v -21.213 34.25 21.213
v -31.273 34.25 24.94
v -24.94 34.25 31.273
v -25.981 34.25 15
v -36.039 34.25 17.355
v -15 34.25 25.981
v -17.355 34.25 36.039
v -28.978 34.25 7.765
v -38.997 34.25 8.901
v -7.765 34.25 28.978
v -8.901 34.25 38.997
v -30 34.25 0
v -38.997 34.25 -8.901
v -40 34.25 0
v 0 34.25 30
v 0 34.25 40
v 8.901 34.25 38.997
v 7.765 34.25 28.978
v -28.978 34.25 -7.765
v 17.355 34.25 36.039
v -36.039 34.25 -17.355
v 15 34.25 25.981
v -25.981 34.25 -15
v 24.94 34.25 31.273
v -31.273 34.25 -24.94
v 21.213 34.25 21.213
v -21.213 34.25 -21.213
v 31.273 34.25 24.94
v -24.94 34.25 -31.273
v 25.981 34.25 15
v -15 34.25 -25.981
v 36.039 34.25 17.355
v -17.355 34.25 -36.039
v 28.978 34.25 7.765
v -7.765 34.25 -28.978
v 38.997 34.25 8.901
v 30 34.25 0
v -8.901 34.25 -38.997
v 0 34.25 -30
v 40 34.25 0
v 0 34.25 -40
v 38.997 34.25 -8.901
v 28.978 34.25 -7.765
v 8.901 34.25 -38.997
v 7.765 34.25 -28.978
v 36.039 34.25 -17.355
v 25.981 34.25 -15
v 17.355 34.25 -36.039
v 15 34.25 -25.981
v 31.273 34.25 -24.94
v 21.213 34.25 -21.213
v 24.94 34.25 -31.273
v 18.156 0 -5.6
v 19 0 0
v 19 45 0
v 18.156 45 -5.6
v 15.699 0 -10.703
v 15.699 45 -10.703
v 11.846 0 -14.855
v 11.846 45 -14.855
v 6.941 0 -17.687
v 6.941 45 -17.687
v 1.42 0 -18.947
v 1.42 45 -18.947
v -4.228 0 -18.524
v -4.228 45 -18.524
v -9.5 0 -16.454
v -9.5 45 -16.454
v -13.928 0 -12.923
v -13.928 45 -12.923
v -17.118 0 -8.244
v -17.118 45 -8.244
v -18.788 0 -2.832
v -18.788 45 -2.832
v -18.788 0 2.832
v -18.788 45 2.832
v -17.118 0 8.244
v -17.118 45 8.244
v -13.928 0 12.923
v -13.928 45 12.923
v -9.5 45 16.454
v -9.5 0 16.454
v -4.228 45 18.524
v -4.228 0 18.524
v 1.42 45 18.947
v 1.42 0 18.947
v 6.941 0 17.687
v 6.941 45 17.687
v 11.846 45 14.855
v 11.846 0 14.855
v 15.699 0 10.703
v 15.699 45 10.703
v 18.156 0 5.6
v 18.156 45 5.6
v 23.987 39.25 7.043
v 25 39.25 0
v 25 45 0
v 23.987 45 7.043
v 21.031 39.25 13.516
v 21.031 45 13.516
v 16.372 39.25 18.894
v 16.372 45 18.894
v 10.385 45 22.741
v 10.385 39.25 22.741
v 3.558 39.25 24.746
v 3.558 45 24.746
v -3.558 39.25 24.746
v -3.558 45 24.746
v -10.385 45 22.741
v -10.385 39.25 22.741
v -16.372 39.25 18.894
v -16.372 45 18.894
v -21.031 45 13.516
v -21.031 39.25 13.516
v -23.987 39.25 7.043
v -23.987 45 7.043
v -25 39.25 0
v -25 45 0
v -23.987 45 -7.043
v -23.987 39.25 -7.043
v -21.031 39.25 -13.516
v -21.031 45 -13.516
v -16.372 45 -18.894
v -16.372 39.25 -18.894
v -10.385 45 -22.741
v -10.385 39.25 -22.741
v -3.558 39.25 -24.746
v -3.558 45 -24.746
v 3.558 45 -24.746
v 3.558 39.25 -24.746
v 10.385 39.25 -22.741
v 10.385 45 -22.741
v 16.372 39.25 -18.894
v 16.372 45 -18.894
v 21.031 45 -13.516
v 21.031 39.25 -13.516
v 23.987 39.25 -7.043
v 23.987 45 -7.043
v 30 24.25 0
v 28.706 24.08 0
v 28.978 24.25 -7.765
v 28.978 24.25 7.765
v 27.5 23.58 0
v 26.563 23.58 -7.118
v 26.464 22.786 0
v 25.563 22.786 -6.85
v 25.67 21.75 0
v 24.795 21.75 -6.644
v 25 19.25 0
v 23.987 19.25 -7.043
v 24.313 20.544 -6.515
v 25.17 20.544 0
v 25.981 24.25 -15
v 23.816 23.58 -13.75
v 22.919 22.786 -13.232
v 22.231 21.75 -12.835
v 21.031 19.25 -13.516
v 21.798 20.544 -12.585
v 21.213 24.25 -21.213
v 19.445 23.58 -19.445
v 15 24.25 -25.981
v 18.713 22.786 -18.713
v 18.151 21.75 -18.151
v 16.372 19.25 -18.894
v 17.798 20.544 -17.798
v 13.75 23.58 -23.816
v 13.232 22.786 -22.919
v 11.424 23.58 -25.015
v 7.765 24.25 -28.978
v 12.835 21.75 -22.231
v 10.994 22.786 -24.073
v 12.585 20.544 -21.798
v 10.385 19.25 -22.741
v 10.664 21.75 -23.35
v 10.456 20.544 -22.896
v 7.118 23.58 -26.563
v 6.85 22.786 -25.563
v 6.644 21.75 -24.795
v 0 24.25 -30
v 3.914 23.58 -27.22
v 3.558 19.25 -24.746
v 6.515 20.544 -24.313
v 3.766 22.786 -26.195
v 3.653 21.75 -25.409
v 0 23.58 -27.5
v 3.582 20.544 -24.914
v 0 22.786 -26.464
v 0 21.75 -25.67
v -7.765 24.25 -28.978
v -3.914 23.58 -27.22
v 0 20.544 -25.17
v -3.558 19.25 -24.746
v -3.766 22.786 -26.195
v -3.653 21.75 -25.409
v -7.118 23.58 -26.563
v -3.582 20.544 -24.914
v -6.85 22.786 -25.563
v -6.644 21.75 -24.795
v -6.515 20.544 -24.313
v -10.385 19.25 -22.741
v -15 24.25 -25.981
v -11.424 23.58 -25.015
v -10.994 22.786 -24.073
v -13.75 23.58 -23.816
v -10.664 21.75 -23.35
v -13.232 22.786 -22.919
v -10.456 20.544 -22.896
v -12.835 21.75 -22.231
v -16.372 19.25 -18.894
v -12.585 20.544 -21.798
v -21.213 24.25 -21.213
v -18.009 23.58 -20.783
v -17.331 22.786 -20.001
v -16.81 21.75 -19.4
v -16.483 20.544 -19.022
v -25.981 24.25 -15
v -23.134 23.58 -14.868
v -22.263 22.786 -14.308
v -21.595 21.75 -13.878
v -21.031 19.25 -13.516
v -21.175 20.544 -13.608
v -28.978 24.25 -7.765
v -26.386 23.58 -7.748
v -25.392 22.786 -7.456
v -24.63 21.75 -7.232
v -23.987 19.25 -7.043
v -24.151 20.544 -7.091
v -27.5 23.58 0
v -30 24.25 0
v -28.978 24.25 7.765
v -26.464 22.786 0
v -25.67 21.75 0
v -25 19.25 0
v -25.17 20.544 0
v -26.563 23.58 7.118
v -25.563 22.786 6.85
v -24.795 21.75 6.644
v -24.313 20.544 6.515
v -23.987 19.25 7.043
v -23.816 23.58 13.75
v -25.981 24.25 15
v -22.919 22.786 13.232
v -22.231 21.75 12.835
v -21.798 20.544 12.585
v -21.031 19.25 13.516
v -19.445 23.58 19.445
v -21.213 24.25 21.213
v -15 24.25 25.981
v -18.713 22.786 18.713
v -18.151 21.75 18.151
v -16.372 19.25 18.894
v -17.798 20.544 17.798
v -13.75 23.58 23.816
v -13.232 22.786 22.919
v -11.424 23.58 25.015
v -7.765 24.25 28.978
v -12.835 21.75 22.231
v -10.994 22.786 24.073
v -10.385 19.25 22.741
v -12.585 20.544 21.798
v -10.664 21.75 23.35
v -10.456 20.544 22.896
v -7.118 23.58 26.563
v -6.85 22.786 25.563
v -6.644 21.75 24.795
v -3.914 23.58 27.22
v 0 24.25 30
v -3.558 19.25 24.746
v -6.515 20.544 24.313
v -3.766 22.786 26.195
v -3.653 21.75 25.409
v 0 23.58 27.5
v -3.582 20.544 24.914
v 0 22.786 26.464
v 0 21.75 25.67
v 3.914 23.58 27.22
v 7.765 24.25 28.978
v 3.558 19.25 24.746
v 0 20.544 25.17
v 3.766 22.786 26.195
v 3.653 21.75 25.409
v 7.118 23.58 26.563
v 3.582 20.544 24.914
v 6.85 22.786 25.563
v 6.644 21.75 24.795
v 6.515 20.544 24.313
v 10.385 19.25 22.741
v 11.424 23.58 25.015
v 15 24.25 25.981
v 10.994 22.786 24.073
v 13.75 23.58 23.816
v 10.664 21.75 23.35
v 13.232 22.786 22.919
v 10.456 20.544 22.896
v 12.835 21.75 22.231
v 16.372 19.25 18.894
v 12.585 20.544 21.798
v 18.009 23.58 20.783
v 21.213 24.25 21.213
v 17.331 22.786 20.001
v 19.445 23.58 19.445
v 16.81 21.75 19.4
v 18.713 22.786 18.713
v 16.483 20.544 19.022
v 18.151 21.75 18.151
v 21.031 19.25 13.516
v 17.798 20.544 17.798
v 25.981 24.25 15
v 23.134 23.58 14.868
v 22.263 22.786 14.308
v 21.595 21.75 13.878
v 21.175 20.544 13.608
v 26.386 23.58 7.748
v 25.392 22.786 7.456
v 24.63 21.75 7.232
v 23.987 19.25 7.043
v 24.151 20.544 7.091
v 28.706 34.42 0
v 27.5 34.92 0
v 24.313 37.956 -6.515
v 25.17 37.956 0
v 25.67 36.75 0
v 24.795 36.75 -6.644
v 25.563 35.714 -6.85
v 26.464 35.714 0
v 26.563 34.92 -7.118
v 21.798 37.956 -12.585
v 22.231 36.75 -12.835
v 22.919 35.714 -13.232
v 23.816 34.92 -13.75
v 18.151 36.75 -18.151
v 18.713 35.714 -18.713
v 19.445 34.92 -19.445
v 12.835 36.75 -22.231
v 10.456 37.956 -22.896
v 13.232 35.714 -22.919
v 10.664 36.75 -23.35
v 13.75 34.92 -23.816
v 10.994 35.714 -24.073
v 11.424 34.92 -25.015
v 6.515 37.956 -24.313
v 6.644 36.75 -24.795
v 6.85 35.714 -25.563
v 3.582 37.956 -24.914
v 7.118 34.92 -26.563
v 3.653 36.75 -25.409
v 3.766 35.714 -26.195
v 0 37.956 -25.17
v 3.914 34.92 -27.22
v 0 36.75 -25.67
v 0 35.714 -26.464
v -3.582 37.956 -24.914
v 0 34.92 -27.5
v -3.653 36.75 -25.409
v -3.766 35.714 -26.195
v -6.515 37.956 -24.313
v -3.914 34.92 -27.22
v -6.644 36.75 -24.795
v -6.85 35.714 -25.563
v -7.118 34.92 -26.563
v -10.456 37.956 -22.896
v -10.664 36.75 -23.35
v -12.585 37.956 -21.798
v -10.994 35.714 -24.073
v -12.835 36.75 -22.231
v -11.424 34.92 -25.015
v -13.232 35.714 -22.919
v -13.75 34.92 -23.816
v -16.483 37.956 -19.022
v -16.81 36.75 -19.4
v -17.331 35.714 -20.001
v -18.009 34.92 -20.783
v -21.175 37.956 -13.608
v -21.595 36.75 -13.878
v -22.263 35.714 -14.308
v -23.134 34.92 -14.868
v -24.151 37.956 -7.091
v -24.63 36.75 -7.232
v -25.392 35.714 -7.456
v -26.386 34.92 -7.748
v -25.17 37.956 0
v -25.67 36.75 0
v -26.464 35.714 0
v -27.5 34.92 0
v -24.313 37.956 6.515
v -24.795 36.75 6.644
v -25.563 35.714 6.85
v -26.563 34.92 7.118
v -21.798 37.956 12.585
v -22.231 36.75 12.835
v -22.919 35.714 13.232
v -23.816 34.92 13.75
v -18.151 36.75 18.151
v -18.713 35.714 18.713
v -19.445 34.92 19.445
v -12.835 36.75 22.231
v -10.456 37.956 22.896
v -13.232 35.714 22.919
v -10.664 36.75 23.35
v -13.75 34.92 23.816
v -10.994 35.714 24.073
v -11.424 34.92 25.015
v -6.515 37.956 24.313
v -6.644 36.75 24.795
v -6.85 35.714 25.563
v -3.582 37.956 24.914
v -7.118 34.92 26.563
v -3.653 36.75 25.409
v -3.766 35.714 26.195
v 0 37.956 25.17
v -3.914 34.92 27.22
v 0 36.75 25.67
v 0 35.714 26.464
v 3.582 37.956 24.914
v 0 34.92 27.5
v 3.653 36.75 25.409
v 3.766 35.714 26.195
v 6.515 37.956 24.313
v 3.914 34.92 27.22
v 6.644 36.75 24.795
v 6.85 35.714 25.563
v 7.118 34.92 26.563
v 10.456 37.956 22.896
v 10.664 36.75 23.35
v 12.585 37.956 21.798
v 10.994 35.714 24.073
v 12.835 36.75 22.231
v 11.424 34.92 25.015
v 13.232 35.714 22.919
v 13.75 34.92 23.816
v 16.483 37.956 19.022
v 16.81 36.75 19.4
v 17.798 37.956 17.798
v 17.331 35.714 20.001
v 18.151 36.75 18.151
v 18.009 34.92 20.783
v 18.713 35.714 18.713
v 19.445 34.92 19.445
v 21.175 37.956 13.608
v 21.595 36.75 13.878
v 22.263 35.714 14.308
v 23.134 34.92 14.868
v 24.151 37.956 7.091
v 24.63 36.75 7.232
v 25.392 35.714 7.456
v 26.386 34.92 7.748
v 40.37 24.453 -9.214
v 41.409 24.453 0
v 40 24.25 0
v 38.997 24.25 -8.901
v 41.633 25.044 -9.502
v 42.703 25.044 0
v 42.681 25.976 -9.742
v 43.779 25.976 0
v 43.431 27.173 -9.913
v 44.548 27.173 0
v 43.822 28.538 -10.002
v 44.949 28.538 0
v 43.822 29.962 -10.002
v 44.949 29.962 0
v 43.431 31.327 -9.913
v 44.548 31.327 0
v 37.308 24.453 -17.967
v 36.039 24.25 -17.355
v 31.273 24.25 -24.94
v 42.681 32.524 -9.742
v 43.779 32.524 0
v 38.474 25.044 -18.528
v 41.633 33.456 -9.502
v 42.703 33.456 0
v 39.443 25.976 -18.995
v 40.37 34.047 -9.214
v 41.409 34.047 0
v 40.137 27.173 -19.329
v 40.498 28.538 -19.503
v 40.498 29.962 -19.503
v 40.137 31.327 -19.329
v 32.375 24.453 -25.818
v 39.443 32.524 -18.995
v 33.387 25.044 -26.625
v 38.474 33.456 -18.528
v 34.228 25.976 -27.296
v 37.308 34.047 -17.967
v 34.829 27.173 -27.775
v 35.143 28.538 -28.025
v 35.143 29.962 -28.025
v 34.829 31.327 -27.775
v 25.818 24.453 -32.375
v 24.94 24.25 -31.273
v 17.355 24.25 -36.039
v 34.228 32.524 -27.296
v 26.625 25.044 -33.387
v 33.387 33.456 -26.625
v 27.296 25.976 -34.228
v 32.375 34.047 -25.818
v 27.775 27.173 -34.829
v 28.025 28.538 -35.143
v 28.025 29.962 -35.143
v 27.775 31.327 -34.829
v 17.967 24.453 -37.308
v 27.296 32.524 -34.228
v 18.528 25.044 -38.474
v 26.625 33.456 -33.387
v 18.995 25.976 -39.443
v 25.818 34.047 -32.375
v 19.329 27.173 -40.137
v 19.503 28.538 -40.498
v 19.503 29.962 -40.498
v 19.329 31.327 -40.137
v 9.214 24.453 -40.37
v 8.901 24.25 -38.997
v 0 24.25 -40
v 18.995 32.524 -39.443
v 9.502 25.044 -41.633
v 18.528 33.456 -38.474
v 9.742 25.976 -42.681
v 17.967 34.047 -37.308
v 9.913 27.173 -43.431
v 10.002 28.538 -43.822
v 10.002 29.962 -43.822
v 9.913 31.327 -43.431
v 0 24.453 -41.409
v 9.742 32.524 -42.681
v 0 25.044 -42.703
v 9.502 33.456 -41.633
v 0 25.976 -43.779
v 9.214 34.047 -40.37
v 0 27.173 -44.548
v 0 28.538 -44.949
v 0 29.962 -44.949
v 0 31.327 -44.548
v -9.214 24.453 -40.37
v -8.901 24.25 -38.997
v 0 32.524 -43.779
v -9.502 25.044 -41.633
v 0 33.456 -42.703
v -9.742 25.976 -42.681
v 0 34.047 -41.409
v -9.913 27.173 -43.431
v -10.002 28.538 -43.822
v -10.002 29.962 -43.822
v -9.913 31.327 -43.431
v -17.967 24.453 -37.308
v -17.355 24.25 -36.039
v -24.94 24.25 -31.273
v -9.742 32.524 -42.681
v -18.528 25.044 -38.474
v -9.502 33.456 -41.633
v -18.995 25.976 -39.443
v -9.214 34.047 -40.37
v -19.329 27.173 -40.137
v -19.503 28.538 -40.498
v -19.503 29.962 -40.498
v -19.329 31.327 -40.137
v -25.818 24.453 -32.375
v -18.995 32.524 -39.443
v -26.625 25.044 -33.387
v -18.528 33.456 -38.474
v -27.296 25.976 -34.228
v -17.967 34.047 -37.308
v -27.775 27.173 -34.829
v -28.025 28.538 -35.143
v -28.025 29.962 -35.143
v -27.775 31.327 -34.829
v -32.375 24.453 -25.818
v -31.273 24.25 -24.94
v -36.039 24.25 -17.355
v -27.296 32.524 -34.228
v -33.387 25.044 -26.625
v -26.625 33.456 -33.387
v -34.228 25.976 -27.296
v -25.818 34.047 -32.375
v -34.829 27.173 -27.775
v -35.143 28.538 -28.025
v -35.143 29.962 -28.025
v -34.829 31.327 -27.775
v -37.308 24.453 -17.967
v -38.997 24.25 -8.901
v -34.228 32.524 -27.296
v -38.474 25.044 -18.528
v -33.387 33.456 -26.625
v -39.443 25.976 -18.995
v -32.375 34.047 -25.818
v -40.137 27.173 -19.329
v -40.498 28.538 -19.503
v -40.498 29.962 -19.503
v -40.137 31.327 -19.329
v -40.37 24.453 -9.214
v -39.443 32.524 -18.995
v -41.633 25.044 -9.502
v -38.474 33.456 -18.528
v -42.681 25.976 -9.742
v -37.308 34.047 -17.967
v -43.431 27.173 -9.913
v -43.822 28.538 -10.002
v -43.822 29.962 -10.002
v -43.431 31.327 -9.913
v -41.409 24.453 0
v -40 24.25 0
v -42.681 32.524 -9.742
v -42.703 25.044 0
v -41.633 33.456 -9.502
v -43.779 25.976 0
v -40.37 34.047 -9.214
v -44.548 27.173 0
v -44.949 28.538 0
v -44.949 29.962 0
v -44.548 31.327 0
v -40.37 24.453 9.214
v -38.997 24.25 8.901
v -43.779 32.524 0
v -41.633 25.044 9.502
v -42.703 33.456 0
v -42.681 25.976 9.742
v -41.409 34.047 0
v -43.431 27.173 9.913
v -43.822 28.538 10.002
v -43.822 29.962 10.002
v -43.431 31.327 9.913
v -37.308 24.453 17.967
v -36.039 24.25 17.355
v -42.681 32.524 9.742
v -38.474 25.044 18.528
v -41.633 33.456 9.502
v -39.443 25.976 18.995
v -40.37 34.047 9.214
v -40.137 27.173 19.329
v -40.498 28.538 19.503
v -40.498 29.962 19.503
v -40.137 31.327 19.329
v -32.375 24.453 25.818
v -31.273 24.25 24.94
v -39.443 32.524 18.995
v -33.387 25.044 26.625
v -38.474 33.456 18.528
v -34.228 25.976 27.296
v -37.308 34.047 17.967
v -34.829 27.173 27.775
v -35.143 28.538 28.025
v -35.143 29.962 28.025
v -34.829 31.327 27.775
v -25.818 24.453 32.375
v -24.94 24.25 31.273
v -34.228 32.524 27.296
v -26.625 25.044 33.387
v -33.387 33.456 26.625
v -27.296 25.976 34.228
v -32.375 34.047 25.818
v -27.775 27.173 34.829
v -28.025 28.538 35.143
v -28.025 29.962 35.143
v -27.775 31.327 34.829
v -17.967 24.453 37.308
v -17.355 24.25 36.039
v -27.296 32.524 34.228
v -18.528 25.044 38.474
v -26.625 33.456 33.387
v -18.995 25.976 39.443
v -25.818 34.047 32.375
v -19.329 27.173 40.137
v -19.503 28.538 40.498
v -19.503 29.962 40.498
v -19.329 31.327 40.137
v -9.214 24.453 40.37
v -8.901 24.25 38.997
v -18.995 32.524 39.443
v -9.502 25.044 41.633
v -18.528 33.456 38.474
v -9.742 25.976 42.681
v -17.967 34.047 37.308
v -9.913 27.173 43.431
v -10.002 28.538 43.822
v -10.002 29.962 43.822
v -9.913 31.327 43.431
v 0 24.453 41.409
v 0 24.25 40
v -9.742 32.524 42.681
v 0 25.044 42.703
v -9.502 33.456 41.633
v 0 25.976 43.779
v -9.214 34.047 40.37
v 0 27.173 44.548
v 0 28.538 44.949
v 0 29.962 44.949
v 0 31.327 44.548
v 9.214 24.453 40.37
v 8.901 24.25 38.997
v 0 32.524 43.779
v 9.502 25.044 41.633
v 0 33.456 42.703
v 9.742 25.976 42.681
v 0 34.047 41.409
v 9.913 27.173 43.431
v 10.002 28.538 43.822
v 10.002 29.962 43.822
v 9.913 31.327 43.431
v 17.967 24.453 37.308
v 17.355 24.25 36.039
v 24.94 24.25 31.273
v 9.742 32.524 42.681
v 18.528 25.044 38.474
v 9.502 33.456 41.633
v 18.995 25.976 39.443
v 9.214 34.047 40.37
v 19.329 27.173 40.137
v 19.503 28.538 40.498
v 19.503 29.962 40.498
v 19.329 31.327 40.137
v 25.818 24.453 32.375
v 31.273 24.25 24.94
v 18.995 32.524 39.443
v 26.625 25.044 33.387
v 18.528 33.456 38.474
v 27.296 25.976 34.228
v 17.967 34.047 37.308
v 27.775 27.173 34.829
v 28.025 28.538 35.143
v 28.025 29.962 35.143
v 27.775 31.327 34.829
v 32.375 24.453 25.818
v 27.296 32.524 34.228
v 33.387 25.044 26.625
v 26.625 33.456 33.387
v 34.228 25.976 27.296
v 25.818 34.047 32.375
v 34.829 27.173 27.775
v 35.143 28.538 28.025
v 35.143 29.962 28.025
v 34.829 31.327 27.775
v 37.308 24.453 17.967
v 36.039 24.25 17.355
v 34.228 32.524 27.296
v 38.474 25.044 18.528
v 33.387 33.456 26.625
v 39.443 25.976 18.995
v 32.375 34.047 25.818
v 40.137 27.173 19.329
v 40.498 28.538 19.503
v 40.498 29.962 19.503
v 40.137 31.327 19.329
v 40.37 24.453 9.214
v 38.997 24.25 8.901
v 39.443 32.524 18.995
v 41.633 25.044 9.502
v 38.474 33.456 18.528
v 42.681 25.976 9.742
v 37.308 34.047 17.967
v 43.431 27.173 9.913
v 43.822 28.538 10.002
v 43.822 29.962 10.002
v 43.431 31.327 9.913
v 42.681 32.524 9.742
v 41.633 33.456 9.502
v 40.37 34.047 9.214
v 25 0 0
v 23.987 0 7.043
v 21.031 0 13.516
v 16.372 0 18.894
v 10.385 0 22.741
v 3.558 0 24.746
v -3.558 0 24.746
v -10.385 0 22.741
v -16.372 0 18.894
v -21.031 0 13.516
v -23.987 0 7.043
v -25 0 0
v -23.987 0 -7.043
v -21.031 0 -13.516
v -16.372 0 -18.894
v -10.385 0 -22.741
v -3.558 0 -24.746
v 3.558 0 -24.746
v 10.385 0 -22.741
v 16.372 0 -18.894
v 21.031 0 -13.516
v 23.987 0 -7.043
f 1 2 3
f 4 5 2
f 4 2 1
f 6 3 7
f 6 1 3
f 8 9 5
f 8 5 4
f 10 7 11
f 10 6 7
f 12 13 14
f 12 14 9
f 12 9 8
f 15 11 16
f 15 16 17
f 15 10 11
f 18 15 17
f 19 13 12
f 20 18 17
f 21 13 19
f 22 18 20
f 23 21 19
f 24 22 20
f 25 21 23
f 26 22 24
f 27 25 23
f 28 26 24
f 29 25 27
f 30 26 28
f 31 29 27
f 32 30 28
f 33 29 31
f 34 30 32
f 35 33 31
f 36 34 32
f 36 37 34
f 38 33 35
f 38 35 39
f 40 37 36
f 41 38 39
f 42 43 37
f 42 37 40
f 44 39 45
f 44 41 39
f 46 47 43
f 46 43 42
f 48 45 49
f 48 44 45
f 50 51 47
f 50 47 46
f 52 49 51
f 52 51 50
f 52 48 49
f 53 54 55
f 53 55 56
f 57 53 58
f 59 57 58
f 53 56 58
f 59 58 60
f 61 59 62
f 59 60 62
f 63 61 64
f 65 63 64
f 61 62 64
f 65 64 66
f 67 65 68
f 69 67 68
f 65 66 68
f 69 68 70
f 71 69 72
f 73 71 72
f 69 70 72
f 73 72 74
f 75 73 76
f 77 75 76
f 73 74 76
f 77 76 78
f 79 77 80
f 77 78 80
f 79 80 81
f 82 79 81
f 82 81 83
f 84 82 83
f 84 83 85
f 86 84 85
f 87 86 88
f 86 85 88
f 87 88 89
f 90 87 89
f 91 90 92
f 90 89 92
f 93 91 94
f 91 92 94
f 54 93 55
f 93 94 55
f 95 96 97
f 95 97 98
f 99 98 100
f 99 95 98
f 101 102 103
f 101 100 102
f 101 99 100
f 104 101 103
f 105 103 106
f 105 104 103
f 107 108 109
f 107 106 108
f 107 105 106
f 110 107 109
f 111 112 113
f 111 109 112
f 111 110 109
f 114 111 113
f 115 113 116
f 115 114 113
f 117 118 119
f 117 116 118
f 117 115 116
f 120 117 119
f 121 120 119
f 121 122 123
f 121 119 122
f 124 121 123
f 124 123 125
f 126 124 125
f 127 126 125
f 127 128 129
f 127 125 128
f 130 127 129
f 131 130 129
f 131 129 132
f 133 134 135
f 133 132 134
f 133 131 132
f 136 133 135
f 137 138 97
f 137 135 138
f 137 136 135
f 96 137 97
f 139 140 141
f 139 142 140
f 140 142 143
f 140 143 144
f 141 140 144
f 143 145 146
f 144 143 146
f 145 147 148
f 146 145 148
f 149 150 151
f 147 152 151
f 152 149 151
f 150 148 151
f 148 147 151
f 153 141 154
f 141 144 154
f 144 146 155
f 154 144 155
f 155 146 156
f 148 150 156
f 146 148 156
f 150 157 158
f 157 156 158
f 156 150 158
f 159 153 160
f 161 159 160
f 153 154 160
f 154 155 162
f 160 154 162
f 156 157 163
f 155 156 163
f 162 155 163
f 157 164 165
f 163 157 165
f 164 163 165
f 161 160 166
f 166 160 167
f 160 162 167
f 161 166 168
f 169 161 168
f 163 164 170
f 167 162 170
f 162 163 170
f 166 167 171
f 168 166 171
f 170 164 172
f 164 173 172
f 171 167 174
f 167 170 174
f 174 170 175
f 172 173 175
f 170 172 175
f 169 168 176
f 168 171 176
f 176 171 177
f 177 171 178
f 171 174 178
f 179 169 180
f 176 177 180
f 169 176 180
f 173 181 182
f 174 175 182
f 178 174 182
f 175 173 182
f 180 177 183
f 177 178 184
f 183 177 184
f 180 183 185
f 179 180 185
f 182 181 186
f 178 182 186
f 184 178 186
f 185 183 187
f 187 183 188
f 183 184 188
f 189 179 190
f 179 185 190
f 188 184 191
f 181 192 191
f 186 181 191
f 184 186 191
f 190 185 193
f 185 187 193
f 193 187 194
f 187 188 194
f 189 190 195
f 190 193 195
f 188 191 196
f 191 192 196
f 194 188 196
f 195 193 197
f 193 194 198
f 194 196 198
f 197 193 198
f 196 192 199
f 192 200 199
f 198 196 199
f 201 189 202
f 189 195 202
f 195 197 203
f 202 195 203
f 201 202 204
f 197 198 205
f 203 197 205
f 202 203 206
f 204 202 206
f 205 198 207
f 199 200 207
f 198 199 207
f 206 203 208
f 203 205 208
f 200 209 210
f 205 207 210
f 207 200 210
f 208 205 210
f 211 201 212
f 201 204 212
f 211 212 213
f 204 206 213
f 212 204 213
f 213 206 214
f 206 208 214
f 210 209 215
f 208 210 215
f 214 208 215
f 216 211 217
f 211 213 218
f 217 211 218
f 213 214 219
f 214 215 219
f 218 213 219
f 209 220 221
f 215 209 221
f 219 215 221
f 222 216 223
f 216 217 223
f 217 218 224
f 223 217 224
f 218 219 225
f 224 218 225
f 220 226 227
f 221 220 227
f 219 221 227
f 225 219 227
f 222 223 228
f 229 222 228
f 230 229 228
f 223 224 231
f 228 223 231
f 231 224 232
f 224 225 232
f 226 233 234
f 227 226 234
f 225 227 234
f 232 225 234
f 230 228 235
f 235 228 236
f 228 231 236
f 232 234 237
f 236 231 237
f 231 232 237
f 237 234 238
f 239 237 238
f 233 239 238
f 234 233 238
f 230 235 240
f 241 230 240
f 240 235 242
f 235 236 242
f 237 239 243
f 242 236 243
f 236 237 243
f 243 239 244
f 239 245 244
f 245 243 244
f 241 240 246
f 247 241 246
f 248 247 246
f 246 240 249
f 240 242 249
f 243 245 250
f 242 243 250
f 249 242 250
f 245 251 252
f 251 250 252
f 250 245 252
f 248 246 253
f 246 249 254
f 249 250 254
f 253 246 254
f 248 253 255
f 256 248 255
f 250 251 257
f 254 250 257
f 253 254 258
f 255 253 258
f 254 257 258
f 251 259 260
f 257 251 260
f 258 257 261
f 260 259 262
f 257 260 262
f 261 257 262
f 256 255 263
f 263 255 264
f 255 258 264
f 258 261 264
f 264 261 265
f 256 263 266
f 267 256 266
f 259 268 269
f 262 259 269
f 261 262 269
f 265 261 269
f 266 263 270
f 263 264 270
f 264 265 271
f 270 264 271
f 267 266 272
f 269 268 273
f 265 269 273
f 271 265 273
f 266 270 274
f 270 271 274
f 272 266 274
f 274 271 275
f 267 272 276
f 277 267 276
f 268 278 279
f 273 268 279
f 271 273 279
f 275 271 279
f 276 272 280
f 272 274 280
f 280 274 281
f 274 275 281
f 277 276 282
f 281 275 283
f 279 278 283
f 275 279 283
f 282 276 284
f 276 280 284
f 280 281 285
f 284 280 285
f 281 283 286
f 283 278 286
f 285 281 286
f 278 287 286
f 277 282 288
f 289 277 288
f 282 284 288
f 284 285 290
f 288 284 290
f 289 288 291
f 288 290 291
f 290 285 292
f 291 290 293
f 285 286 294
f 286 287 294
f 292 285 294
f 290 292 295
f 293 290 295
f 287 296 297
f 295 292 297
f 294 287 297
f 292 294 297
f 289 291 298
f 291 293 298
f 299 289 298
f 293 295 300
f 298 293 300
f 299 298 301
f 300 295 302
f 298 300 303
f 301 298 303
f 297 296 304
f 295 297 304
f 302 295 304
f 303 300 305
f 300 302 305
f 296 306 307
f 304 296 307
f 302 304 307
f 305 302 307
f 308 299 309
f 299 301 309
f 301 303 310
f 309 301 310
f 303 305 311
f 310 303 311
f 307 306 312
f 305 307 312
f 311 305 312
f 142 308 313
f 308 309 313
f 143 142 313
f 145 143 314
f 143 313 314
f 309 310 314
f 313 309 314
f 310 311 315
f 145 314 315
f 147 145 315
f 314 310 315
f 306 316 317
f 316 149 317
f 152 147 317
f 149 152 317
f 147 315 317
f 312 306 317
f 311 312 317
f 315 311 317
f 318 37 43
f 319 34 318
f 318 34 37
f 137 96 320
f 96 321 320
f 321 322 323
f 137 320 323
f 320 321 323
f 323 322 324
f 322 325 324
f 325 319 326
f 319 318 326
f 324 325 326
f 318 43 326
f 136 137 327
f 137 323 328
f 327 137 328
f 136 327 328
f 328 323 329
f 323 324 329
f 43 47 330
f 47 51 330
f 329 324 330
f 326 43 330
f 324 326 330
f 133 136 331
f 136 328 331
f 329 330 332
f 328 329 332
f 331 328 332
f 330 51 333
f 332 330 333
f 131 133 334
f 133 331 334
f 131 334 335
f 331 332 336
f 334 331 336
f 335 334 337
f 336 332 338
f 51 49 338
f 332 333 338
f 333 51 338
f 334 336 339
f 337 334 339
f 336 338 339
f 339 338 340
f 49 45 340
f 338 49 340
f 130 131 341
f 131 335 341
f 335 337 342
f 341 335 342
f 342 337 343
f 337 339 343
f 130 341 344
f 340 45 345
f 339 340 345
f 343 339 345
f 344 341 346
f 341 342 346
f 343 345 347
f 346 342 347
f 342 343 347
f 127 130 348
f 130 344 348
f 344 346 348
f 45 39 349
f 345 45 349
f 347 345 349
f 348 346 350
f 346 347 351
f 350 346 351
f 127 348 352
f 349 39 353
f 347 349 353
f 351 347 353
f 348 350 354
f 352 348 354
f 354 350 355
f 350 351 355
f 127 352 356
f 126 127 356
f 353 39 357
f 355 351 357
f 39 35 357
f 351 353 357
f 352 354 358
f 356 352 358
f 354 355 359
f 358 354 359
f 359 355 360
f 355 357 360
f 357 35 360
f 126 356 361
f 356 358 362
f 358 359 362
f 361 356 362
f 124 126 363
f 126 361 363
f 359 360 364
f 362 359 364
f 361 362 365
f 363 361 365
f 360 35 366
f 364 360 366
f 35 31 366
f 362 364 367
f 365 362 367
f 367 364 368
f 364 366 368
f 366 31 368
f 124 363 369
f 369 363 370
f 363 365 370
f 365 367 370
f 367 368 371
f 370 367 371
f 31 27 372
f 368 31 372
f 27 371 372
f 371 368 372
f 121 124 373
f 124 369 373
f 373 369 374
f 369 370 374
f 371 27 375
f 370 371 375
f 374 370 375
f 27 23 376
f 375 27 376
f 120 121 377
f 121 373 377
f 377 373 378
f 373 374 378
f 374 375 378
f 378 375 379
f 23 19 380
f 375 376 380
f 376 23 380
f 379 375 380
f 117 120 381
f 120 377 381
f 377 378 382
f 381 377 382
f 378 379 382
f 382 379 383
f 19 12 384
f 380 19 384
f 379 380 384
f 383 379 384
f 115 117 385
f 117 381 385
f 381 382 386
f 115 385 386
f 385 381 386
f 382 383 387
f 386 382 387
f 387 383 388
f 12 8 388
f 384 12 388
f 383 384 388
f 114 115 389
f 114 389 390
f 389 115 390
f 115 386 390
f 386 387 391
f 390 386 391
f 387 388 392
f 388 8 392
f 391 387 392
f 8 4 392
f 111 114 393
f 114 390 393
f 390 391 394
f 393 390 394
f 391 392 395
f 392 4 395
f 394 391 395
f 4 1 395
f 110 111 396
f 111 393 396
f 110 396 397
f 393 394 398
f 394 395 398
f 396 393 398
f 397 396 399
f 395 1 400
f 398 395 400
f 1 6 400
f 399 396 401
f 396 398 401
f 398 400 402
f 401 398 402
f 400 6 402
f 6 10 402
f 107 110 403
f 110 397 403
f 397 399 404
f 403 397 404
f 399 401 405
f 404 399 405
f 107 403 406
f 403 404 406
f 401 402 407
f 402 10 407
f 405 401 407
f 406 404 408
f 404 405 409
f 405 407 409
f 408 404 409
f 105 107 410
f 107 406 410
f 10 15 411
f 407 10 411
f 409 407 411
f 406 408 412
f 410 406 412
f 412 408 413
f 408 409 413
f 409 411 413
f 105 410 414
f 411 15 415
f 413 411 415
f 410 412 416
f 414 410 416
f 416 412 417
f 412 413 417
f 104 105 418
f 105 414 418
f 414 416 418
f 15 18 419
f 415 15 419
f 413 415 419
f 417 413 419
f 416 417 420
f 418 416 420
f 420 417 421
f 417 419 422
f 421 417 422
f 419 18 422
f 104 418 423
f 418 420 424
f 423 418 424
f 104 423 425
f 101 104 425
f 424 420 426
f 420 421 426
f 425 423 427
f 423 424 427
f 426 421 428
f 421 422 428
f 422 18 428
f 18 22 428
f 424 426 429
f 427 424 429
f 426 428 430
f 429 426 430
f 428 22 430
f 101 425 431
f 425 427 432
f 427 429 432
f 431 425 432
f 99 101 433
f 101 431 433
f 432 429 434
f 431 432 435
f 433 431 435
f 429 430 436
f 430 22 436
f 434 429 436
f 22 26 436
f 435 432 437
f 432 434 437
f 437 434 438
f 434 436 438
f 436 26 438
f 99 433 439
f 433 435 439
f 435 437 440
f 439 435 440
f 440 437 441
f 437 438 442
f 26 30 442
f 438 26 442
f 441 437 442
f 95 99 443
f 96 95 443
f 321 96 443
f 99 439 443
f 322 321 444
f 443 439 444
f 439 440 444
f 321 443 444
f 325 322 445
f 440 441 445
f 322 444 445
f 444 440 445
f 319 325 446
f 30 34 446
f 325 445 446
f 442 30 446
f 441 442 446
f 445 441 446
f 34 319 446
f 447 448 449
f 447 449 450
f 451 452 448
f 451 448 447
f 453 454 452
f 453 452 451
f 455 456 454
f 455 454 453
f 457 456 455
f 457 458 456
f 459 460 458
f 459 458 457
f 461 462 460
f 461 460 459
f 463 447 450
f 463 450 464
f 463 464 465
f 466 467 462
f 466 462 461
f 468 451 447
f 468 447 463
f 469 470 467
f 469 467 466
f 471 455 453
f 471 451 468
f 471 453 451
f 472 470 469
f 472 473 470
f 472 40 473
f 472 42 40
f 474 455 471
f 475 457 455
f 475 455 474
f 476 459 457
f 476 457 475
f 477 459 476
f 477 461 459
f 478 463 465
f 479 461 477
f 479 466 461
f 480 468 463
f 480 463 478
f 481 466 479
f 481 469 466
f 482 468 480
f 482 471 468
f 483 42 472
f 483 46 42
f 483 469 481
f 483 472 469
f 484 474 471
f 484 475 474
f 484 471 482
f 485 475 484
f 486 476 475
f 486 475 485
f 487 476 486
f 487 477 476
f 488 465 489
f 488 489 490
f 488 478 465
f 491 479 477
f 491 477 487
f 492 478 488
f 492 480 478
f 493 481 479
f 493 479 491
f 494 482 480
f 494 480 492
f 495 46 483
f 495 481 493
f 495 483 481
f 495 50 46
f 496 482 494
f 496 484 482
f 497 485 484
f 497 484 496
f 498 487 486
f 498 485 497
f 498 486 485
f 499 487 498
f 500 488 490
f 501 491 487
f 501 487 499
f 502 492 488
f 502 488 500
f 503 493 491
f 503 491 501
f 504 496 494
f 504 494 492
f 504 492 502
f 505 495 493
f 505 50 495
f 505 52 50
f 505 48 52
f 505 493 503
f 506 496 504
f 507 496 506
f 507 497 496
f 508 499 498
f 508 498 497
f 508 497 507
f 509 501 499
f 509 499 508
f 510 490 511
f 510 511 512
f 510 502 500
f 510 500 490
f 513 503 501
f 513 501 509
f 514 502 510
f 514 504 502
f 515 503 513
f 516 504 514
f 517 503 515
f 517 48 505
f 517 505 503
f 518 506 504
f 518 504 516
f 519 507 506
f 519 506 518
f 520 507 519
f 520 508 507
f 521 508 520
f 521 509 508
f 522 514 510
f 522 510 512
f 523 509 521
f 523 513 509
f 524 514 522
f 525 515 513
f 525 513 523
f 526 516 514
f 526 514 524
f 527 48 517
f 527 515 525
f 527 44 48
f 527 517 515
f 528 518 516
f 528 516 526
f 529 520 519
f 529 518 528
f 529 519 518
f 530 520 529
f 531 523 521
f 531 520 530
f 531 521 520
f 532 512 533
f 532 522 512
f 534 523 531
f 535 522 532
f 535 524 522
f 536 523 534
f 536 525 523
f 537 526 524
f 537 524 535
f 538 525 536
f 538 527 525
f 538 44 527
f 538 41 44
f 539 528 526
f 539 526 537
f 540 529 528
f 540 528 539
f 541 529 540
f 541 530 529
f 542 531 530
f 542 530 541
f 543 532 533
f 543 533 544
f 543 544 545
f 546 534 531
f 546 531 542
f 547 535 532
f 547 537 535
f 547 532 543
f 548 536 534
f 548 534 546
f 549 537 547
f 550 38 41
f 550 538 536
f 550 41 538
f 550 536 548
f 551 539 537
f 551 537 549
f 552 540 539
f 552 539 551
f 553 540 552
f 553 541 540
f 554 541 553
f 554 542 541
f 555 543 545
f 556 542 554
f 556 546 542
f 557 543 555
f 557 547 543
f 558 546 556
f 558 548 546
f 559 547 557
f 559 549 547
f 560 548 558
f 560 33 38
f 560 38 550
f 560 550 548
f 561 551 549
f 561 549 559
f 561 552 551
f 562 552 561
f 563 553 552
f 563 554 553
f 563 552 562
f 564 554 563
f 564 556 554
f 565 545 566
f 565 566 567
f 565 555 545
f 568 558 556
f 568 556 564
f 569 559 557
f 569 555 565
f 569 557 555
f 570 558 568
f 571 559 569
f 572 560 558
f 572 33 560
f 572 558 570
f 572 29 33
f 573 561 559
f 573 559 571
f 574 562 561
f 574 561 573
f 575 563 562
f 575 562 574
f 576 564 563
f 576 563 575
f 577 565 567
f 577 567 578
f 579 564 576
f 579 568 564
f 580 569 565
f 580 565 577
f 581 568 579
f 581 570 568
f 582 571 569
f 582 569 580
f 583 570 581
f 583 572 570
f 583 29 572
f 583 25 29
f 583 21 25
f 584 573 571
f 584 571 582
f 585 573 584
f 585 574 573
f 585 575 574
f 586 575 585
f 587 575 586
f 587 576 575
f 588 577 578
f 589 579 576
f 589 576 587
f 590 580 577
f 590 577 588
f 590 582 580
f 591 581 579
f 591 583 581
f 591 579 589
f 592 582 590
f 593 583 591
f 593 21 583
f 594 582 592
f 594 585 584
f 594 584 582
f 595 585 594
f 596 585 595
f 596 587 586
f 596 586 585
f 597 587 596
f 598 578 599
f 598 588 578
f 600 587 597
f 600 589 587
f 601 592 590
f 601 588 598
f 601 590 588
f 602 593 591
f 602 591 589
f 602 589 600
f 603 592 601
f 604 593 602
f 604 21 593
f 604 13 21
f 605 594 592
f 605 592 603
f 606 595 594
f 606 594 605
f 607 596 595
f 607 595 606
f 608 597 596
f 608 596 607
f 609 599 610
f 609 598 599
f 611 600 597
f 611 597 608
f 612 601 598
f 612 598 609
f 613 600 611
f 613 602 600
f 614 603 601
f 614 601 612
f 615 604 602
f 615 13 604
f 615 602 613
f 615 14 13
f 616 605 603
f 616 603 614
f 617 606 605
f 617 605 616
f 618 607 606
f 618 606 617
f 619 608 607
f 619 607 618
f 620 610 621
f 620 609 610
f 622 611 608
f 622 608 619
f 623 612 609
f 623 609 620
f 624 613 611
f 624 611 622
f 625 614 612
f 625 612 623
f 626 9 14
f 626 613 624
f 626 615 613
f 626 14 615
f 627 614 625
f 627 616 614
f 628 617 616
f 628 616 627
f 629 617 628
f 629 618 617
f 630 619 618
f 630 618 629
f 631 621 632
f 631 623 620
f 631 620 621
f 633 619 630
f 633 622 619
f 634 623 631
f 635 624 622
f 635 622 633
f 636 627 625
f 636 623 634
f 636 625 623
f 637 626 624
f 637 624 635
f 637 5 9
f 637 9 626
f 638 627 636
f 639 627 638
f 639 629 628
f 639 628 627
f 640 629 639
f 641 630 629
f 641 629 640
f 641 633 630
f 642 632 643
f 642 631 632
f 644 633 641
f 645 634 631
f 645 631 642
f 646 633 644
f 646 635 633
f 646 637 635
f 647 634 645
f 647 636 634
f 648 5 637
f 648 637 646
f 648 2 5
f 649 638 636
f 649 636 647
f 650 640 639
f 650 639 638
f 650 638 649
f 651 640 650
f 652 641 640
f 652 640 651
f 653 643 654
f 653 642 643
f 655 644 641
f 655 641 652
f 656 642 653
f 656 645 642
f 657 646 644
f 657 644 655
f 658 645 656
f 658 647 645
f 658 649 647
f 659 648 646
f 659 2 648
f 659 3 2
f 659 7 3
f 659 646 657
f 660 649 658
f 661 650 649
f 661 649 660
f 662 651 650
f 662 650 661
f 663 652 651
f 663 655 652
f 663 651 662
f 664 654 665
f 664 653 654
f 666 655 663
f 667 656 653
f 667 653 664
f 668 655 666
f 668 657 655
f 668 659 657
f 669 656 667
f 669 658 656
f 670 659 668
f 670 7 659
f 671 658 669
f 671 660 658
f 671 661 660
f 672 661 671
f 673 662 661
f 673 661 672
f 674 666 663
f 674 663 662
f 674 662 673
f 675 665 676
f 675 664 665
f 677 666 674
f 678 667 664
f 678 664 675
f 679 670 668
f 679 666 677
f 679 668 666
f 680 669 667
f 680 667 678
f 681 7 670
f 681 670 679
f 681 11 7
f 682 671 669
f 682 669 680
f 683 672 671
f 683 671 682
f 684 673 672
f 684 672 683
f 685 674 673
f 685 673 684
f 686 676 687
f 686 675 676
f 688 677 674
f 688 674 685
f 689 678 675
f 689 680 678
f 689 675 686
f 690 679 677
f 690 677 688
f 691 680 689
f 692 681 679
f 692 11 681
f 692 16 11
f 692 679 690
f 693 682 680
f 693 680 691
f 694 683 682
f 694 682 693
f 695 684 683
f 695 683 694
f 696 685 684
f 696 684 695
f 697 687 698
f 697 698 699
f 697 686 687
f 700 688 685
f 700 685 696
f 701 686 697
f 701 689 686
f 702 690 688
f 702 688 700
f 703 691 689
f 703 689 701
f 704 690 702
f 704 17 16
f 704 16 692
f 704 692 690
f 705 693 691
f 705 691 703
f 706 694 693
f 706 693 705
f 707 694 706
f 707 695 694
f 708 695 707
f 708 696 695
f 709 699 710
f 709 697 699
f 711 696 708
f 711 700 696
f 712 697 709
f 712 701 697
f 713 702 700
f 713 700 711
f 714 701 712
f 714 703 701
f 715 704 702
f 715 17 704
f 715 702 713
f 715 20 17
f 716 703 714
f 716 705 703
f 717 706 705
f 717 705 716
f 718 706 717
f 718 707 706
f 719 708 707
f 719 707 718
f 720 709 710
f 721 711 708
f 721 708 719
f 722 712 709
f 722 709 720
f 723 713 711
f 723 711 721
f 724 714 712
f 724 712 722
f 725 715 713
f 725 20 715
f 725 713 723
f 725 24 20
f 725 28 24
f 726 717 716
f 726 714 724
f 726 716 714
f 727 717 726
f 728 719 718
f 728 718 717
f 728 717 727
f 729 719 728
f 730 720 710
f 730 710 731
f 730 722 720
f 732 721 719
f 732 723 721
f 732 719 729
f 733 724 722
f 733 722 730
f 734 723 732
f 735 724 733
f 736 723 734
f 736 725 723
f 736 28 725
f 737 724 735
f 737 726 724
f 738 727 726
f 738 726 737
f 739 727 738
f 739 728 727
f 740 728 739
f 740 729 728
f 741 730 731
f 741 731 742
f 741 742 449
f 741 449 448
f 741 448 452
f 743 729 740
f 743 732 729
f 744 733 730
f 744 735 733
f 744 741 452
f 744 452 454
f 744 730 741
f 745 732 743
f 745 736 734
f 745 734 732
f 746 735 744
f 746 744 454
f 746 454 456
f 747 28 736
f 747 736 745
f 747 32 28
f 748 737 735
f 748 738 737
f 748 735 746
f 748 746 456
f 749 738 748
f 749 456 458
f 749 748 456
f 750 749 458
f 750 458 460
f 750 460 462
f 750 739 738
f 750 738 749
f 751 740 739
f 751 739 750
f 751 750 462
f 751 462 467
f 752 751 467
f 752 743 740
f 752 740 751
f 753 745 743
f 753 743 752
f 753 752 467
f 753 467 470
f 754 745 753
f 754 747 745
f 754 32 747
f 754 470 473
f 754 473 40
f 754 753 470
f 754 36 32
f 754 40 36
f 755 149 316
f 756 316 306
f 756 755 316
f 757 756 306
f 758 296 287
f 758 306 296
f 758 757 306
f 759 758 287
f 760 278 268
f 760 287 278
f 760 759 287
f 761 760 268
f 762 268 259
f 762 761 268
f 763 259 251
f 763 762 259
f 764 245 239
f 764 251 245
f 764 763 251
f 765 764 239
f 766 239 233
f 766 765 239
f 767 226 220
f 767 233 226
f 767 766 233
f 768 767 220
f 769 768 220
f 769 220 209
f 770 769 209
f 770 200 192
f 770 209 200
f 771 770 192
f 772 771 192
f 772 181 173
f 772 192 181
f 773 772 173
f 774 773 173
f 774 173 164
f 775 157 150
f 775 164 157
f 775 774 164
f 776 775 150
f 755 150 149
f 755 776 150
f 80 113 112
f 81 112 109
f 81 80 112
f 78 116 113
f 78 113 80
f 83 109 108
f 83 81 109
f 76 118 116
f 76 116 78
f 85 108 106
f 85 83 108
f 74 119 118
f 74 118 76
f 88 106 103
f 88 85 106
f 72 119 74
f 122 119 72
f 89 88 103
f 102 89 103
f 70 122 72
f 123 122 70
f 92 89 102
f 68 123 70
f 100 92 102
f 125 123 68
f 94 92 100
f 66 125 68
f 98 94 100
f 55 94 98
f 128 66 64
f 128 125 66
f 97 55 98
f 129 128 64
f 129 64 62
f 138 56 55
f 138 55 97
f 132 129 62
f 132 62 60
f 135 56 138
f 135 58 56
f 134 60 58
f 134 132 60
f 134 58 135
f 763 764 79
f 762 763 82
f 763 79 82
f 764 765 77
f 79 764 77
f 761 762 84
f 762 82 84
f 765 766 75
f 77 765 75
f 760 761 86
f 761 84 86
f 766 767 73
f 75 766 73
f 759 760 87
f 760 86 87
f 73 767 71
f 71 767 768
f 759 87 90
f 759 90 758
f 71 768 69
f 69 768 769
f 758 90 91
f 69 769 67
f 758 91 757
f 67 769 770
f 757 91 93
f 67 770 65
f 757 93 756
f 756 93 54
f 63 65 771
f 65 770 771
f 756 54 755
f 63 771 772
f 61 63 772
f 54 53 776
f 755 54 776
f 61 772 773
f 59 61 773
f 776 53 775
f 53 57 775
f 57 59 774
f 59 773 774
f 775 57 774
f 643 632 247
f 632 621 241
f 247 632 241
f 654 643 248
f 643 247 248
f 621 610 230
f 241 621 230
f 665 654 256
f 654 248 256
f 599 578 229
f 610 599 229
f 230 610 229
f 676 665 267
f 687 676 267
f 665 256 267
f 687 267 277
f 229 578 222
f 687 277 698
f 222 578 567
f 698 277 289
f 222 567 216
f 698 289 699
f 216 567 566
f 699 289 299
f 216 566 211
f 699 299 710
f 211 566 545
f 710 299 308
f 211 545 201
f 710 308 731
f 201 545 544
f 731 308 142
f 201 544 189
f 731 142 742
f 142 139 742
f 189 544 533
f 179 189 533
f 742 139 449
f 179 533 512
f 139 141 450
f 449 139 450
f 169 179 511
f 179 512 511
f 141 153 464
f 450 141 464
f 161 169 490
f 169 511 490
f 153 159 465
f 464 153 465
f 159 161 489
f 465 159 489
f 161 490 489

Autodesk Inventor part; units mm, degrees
ref_plane "YZ Plane" through (0, 0, 0) normal (1, 0, 0) x (0, 1, 0)
ref_plane "XZ Plane" through (0, 0, 0) normal (0, 1, 0) x (-1, 0, 0)
ref_plane "XY Plane" through (0, 0, 0) normal (0, 0, 1) x (1, 0, 0)
sketch "Sketch1" plane through (0, 0, 0) normal (0, 0, 1) x (1, 0, 0)
  line L0 (0, 0) -> (0, 45)
  line L1 (19, 0) -> (19, 45)
  line L2 (19, 45) -> (25, 45)
  line L3 (25, 45) -> (25, 34.25)
  line L4 (25, 34.25) -> (40, 34.25)
  line L5 (40, 24.25) -> (25, 24.25)
  line L6 (25, 24.25) -> (25, 0)
  line L7 (25, 0) -> (19, 0)
  arc A0 (40, 24.25) -> (40, 34.25) centre (40, 29.25) ccw
  point P0 (45, 29.25)
  dimension "d2" = 45
  dimension "d3" = 38
  dimension "d4" = 6
  dimension "d6" = 10
  dimension "d8" = 90
revolve "Revolution1" add sketch "Sketch1" angle 360 about axis through (0, 0, 0) along (0, 1, 0)
fillet "Fillet1" radius 5 2 edges at (-25, 34.25, 0) (-25, 24.25, 0)
thread "Thread1" size "M38x1.5" class "6H" standard "ISO Metric profile" full length
properties part number "nut" material "Brass, Soft Yellow, Welded"
